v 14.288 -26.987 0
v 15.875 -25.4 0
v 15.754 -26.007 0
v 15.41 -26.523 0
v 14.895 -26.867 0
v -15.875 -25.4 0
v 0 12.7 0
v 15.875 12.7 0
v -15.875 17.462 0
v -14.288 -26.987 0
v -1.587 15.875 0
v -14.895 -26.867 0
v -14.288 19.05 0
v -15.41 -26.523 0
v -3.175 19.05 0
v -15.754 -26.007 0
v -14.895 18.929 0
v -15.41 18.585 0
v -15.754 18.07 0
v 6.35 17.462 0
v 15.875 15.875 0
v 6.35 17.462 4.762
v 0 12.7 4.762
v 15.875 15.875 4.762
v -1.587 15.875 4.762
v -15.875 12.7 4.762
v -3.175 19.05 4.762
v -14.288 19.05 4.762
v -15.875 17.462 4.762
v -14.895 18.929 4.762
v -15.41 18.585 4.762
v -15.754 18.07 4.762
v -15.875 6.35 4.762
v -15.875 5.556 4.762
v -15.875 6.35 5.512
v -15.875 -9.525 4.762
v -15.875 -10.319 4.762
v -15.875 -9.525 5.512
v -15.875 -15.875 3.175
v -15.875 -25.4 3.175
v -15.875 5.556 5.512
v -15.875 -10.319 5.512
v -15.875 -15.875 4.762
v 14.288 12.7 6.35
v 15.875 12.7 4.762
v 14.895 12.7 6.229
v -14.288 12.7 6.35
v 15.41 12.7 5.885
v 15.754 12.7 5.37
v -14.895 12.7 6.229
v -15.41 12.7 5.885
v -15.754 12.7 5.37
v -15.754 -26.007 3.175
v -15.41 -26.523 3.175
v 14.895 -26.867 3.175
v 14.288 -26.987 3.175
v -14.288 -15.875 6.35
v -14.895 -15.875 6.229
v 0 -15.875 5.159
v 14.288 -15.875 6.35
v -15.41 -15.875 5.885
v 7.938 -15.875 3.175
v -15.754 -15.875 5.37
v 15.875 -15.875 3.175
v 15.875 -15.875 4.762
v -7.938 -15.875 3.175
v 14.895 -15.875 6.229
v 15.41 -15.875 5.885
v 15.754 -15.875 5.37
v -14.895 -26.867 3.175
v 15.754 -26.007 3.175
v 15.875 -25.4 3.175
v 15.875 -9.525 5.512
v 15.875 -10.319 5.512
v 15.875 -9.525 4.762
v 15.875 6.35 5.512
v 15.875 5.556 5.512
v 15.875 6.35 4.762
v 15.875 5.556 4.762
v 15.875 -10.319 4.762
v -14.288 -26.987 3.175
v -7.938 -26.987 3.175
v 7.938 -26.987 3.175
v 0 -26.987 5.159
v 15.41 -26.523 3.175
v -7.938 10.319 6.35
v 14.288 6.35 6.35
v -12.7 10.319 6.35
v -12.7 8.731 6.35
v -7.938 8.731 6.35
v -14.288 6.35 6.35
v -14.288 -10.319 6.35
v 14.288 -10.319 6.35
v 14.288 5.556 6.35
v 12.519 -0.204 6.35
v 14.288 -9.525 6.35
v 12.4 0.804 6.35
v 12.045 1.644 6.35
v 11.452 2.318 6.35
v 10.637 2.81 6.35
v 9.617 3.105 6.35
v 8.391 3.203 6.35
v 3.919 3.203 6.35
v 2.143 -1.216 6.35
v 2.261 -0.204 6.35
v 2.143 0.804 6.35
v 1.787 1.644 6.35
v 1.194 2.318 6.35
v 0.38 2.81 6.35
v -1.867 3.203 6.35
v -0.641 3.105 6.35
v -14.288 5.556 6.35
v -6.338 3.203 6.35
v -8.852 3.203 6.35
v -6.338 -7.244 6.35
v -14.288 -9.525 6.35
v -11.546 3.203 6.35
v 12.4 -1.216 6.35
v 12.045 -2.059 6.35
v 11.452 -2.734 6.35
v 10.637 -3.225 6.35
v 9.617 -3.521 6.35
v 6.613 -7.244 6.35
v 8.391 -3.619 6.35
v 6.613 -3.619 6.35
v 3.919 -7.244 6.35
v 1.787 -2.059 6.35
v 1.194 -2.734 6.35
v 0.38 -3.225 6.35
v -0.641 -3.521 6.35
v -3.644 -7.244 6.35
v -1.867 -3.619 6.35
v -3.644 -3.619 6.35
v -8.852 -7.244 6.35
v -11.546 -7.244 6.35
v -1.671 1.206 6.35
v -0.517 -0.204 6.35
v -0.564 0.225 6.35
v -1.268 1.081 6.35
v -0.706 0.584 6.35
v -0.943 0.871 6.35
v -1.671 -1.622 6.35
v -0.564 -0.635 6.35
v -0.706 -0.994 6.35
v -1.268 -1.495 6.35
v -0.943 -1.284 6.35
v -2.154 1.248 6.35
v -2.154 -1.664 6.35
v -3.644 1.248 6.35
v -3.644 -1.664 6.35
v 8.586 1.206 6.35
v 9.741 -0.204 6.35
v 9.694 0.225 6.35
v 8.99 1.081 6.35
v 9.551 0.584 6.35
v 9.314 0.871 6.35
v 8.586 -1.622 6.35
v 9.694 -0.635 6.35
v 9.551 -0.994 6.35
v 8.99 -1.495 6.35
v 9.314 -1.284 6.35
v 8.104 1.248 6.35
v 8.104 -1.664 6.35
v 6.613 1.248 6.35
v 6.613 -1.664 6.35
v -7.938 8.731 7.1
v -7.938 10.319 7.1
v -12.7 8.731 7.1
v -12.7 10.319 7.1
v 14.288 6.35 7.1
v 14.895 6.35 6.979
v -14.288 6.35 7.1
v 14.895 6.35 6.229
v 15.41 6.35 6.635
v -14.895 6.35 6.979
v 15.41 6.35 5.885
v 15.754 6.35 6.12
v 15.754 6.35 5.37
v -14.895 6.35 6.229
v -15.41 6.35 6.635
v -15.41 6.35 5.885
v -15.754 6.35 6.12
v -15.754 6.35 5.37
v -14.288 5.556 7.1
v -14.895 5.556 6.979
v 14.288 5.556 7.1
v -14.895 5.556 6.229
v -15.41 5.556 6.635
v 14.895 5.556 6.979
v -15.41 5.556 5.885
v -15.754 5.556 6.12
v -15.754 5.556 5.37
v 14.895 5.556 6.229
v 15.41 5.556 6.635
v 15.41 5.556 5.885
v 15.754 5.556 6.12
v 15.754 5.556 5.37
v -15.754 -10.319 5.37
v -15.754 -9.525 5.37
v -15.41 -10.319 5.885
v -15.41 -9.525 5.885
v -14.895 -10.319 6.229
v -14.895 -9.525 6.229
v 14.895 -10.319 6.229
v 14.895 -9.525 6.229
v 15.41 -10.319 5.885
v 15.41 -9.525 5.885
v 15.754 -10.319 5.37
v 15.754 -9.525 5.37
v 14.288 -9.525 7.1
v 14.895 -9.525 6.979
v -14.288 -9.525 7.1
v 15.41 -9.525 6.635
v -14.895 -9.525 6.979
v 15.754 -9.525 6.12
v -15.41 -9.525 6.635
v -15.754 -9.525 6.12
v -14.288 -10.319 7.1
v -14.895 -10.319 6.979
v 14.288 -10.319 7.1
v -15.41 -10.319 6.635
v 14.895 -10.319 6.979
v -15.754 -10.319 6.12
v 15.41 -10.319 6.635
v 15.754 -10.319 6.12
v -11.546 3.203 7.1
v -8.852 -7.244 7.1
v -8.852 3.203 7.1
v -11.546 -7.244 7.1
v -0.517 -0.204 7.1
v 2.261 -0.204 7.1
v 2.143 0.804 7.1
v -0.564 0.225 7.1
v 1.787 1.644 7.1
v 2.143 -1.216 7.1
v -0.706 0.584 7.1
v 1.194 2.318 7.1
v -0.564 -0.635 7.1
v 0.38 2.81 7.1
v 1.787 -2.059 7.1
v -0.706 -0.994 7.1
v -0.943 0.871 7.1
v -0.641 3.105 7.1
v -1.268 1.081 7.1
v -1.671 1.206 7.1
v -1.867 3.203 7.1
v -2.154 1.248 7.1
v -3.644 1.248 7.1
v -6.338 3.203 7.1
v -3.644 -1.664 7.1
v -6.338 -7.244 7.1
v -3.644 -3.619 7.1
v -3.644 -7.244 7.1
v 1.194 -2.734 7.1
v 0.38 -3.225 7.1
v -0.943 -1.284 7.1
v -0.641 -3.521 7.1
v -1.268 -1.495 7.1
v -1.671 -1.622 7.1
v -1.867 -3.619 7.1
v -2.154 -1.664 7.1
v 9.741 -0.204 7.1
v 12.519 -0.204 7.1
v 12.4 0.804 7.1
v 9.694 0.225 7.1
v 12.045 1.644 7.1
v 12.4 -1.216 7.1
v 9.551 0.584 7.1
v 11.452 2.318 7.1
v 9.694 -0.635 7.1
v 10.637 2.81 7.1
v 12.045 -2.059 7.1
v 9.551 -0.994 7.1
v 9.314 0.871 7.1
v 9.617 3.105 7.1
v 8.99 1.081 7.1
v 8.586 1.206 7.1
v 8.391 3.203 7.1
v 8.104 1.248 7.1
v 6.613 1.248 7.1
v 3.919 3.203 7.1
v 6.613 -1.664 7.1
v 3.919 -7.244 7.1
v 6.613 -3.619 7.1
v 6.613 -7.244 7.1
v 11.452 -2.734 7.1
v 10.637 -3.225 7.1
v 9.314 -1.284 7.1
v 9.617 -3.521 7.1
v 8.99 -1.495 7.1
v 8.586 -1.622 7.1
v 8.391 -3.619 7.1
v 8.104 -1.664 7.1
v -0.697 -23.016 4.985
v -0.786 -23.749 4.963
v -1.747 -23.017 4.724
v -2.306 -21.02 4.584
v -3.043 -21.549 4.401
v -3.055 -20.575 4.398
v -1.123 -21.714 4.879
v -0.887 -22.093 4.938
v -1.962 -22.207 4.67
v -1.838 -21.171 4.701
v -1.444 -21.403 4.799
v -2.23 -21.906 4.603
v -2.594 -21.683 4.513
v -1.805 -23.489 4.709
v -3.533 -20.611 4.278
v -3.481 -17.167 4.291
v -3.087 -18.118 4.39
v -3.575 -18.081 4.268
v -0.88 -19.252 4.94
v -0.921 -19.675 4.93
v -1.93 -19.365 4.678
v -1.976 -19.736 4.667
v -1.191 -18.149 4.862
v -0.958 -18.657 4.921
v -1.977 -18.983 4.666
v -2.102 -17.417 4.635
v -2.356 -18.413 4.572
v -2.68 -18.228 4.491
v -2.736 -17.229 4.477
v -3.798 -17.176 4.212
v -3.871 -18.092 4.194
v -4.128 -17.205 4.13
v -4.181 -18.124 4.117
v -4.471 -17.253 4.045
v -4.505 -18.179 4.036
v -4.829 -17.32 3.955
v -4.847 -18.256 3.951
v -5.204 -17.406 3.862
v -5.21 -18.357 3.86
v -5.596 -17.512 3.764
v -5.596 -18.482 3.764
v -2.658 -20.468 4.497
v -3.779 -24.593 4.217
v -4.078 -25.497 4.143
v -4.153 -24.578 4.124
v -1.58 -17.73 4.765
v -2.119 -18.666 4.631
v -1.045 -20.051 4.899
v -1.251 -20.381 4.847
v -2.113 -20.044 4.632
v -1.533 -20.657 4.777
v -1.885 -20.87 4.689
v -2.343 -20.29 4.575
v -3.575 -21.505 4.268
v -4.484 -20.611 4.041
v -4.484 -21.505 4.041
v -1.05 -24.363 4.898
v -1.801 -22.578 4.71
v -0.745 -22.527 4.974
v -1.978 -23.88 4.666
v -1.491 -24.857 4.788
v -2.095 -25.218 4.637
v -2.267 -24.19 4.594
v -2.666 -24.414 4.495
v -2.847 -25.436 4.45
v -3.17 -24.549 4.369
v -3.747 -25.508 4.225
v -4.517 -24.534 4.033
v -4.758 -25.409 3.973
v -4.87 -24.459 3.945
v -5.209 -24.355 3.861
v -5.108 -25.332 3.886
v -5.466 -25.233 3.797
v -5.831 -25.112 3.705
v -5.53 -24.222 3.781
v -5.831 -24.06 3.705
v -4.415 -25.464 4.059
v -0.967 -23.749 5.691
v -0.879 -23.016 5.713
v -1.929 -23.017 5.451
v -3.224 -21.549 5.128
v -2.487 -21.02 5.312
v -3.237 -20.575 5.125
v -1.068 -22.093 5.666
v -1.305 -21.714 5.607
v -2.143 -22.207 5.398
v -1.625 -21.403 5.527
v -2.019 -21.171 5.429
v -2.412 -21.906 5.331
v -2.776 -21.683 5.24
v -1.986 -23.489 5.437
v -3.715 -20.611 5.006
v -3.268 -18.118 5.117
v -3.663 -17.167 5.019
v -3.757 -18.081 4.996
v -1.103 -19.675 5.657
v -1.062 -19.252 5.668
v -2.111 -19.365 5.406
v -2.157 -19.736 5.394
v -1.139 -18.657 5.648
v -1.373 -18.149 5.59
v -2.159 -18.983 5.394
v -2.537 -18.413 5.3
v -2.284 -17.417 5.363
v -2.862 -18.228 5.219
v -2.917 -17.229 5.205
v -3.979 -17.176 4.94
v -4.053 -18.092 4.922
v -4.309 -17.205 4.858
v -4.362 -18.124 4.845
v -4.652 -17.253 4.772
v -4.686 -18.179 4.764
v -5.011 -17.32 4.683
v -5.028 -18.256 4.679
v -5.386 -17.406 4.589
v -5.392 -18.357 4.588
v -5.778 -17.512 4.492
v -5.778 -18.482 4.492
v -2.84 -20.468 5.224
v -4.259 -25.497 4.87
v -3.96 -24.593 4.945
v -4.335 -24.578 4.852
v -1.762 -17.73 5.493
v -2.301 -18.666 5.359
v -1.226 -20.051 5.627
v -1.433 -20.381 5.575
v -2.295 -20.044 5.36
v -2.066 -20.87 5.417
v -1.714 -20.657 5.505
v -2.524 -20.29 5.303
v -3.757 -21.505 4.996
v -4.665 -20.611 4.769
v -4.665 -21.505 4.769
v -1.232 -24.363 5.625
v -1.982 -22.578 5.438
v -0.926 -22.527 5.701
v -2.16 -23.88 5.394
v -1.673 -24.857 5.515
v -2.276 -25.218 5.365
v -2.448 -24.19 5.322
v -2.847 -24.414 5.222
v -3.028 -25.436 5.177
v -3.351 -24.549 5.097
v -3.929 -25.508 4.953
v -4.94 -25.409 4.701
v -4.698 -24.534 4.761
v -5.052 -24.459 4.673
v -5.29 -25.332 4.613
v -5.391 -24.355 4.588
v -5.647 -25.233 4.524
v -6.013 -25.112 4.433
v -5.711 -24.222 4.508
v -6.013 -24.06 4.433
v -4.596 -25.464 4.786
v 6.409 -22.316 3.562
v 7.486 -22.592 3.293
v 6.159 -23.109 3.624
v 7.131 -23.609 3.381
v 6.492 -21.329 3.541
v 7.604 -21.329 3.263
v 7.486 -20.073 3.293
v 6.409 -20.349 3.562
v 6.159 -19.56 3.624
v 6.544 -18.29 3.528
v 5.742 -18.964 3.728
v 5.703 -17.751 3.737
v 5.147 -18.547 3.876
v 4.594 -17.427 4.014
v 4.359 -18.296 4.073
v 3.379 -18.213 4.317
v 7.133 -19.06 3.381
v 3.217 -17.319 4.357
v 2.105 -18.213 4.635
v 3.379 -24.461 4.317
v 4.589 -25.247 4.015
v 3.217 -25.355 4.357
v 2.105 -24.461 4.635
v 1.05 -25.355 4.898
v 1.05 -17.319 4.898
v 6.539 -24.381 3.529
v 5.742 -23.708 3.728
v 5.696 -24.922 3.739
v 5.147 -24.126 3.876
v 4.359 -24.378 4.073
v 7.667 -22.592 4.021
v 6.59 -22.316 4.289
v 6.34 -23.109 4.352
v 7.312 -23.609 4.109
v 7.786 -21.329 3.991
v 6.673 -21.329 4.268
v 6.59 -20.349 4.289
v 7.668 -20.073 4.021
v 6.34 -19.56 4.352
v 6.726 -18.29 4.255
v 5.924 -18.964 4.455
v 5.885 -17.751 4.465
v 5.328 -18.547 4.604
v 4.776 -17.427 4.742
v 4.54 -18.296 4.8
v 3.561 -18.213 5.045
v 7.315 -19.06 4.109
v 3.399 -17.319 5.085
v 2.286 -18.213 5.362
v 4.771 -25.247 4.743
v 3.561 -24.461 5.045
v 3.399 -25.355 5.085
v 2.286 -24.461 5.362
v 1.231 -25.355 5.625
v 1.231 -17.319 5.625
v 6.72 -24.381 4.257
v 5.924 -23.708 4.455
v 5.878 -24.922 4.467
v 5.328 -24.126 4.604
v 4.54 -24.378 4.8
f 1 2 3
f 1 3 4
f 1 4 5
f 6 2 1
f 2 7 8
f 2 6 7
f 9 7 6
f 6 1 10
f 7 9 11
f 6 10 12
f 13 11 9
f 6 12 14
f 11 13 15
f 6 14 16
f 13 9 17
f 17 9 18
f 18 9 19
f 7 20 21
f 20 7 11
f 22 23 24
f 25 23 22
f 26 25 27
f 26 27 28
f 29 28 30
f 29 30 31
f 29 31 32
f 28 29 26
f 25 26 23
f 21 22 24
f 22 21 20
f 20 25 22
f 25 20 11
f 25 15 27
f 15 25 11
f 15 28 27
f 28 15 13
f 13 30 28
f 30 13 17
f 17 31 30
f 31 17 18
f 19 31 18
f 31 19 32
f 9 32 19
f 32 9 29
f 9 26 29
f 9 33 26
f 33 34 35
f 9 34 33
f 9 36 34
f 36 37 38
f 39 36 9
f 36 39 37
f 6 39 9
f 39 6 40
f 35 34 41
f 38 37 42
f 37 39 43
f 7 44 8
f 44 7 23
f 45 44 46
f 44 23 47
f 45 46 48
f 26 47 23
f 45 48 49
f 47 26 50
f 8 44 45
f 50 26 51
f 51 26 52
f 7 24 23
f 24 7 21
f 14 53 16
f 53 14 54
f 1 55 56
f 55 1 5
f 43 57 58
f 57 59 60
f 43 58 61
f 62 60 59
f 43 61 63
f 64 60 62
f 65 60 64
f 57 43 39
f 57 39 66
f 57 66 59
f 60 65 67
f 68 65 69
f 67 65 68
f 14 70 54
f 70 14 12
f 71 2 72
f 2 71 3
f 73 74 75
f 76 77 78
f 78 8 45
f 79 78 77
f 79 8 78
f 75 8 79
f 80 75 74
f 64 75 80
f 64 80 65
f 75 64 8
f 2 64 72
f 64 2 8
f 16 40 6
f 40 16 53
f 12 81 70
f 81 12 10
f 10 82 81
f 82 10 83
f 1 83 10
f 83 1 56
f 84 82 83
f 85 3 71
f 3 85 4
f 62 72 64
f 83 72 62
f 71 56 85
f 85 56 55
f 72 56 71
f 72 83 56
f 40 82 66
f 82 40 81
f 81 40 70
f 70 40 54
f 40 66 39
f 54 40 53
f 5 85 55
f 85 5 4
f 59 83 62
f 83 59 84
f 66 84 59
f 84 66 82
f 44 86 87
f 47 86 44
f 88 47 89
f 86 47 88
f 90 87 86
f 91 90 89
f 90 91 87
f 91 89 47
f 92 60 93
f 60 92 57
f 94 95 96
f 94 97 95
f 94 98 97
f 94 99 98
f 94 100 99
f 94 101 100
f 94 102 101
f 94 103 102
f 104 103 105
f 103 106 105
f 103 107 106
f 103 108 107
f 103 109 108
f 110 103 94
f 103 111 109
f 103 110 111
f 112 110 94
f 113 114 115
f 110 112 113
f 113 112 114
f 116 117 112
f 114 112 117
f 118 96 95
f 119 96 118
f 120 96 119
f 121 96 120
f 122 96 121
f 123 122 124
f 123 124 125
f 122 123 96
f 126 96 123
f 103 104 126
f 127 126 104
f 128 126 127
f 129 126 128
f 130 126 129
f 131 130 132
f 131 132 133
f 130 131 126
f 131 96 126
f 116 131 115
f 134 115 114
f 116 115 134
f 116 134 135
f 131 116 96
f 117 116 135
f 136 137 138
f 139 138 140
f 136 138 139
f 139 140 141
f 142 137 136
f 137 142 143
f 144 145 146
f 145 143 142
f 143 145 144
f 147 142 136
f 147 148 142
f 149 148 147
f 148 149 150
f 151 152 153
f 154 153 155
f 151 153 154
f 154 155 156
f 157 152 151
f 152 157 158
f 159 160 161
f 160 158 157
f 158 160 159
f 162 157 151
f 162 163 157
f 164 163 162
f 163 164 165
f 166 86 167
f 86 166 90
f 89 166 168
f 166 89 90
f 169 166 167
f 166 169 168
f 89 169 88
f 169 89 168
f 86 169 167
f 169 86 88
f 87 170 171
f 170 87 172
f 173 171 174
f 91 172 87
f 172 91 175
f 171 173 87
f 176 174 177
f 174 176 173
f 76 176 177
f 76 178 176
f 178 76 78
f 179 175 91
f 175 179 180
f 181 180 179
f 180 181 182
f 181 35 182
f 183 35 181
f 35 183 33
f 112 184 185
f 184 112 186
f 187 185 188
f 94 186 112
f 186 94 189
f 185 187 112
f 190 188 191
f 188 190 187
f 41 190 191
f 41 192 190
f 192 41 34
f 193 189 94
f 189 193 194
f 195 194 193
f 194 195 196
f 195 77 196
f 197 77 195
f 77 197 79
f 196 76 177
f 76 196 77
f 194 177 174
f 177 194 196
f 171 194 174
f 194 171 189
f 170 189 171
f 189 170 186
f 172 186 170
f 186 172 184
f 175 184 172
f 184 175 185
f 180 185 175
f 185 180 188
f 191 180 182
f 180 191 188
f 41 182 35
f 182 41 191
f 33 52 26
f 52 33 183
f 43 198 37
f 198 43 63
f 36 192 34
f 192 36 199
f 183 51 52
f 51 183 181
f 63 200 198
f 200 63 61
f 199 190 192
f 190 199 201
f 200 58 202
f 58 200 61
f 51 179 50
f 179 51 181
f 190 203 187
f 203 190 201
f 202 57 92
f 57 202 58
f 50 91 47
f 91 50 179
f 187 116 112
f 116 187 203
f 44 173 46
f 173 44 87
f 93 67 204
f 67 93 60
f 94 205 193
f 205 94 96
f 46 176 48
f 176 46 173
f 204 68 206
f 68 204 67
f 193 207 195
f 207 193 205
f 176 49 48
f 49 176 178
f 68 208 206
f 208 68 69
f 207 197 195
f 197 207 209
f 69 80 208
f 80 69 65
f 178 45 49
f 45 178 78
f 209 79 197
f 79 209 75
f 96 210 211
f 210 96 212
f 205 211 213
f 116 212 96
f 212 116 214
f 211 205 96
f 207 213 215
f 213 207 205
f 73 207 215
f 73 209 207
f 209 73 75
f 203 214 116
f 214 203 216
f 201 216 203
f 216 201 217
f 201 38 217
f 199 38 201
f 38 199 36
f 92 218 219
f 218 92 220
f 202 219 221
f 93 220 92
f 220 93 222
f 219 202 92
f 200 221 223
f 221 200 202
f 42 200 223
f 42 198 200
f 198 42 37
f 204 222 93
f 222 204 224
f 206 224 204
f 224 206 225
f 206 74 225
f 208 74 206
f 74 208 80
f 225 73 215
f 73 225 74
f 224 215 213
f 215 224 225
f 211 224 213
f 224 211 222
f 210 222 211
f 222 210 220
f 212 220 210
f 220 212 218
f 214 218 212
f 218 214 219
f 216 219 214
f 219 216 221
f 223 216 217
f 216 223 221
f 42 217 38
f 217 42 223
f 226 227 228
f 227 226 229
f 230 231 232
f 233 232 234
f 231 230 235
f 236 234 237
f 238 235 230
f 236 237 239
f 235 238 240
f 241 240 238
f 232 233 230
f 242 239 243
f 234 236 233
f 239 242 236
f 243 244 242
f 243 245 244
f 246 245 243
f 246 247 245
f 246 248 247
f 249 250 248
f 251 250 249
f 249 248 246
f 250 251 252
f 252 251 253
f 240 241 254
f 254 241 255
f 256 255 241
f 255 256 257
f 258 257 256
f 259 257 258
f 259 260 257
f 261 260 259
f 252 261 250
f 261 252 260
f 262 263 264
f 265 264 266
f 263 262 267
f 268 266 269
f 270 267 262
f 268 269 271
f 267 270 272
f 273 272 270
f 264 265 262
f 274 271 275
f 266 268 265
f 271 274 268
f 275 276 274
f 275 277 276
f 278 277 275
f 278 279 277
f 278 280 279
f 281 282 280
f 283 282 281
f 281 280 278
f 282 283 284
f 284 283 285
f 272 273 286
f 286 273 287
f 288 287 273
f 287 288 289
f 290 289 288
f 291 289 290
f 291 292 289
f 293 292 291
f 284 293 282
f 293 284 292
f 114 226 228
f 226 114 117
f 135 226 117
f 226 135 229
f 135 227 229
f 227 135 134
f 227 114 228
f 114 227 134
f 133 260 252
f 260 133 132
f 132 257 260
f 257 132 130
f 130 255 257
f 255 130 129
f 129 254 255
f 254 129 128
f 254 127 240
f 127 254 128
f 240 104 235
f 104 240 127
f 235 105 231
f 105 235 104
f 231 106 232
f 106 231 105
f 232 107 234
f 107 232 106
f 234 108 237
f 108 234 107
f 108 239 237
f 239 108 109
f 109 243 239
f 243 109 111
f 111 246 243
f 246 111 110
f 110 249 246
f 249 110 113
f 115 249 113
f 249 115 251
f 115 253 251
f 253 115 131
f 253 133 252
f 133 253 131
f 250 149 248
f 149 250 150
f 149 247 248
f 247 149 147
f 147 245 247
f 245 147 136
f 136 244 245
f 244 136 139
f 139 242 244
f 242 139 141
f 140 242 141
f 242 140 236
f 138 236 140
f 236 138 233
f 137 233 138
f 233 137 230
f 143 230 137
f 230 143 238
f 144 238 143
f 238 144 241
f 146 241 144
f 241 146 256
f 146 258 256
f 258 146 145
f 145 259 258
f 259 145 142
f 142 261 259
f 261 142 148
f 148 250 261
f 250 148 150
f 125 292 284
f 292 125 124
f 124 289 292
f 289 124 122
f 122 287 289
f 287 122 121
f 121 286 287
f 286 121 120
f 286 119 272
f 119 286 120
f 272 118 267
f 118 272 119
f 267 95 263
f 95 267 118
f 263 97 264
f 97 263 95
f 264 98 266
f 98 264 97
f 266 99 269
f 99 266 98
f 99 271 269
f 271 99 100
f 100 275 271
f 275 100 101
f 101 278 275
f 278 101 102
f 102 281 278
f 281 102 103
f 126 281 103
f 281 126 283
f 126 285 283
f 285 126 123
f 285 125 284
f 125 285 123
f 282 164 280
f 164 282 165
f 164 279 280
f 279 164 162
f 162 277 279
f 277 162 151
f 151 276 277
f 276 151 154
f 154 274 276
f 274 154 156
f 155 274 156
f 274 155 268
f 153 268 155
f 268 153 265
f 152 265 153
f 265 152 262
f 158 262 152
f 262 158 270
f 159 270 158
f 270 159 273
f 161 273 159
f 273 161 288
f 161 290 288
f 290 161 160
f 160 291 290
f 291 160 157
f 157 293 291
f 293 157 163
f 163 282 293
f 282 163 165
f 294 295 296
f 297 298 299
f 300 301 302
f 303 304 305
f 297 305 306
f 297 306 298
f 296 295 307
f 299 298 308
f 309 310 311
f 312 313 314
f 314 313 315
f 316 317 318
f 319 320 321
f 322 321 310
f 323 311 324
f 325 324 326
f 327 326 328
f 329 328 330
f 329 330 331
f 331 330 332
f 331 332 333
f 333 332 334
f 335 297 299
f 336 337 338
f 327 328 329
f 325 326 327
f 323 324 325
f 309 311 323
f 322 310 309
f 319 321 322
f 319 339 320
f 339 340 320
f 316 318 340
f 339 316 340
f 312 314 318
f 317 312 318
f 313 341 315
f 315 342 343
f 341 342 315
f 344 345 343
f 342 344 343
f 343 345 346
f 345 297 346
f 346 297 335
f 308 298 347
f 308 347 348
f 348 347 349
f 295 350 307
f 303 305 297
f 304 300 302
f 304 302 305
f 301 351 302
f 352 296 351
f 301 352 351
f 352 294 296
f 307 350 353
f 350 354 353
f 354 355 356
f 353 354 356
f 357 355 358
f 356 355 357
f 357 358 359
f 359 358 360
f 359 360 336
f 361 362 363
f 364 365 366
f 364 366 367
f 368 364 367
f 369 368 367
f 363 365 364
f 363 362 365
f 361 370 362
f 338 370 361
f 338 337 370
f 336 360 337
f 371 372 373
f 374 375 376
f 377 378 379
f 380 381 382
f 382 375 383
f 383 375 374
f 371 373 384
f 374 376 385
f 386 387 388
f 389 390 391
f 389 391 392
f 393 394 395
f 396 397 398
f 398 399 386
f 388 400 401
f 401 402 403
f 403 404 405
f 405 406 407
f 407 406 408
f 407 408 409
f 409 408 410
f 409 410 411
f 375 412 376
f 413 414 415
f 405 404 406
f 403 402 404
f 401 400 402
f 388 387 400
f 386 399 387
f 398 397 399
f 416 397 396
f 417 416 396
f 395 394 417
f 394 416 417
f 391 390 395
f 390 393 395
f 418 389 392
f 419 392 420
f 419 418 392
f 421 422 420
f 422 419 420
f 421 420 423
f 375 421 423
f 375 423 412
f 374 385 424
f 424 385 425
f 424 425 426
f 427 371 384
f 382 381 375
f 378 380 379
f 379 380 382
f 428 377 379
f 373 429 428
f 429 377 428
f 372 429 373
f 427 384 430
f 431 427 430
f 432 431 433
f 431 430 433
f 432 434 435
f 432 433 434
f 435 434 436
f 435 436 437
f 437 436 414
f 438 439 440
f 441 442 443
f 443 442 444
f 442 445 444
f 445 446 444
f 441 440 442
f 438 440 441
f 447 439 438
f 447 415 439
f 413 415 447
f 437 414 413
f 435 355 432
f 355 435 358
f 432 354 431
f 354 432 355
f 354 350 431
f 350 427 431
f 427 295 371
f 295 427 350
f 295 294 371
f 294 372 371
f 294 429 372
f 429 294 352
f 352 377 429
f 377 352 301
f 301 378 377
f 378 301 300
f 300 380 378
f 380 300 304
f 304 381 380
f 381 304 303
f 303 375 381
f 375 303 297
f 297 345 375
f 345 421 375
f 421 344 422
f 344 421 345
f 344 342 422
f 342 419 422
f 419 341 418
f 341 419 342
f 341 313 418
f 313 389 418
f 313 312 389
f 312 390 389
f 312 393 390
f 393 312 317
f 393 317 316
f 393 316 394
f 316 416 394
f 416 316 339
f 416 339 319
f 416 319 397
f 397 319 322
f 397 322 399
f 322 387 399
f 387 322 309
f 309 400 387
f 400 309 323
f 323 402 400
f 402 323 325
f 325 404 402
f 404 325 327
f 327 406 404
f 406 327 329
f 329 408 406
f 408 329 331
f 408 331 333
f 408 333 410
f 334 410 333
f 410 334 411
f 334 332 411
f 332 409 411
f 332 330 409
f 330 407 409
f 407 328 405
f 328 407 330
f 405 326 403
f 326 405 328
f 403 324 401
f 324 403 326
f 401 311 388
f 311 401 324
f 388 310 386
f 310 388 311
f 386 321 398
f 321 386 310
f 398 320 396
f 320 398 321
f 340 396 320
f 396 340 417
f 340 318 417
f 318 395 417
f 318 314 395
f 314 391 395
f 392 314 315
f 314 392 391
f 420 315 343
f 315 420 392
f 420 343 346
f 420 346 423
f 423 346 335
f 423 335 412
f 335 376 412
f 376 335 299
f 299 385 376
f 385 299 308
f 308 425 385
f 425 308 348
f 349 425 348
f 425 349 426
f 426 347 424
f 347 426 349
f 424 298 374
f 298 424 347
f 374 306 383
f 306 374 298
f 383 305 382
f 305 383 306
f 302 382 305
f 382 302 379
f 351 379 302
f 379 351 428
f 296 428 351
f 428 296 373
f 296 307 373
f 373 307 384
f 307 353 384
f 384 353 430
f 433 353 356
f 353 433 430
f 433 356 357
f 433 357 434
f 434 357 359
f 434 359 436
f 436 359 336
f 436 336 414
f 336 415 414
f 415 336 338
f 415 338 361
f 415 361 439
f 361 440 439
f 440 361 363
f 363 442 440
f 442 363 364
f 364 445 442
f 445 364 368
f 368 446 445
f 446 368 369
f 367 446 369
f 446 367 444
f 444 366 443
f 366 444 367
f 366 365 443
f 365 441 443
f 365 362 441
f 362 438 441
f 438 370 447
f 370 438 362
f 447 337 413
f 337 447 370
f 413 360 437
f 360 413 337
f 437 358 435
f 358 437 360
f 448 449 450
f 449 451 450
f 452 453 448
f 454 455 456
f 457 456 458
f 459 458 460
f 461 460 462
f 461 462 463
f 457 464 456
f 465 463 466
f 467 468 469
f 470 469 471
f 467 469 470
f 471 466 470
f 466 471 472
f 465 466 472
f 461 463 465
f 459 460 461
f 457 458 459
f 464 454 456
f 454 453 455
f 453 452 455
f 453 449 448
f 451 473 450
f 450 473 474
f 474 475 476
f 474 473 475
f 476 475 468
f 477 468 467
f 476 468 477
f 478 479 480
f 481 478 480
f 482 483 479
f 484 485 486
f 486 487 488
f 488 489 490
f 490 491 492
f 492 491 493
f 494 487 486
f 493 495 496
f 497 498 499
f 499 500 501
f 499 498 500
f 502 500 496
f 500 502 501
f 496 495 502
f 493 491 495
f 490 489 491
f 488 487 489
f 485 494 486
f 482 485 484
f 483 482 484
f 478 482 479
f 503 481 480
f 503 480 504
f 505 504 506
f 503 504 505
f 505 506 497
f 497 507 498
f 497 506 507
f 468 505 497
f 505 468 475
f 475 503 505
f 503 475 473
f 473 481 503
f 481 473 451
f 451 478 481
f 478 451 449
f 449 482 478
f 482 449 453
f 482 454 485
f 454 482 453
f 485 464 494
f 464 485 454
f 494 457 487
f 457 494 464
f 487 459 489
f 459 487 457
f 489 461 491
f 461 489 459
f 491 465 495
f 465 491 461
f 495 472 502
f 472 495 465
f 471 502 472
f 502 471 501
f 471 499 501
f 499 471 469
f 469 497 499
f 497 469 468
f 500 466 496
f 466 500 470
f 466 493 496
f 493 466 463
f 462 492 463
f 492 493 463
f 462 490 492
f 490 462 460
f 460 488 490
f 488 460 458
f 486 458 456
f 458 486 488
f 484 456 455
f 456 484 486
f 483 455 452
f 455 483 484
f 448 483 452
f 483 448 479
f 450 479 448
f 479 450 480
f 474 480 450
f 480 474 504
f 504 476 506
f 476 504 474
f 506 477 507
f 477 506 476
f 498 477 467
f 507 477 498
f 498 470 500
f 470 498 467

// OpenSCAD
/*
 * A 3D interpretation of the PWG IPP logo.
 *
 * Copyright © 2016 by Michael R Sweet.
 */

/* Parameters */
$finalwidth = 1.25 * 25.4;
$scaling    = $finalwidth / 20.0;
$bumpout    = 0.75 / $scaling;

scale(v=[$scaling,$scaling,$scaling]) {
    /* COLOR: BLACK */
    color([0.25,0.25,0.25]) {
        /* Scanner head */
        linear_extrude(height=3) {
            polygon(points=[[-10,8],[-10,11],[-9-cos(22.5),11+sin(22.5)],[-9-cos(45),11+sin(45)],[-9-cos(67.5),11+sin(67.5)],[-9,12],[-2,12],[-1,10],[4,11],[10,10],[0,8]]);
        }
        /* Base for "3D" */
        linear_extrude(height=2) {
            polygon(points=[[-10,-16],[-10,-10],[10,-10],[10,-16],[9+cos(22.5),-16-sin(22.5)],[9+cos(45),-16-sin(45)],[9+cos(67.5),-16-sin(67.5)],[9,-17],[-9,-17],[-9-cos(67.5),-16-sin(67.5)],[-9-cos(45),-16-sin(45)],[-9-cos(22.5),-16-sin(22.5)]]);
        }
        /* Small wedge for "3D" */
        translate(v=[0,-10,2]) {
            rotate(a=[90,0,0]) {
                linear_extrude(height=7) {
                    polygon(points=[[-5,0],[0,1.25],[5,0]]);
                }
            }
        }
    }
    
    /* COLOR: PWG BLUE */
    color([75/255,90/255,168/255]) {
        /* Center body */
        translate(v=[0,8,0]) {
            rotate(a=[90,0,0]) {
                linear_extrude(height=18) {
                    polygon(points=[[-10,0],[-10,3],[-9-cos(22.5),3+sin(22.5)],[-9-cos(45),3+sin(45)],[-9-cos(67.5),3+sin(67.5)],[-9,4],[9,4],[9+cos(67.5),3+sin(67.5)],[9+cos(45),3+sin(45)],[9+cos(22.5),3+sin(22.5)],[10,3],[10,0]]);
                }
            }
        }
    }
    
    /* COLOR: WHITE */
    color([1,1,1]) {
        /* Activity light */
        translate(v=[0,0,4]) {
            linear_extrude(height=$bumpout) {
                polygon(points=[[-8,5.5],[-8,6.5],[-5,6.5],[-5,5.5]]);
            }
        }
        /* Top line */
        translate(v=[0,4,0]) {
            rotate(a=[90,0,0]) {
                linear_extrude(height=0.5) {
                    $bottom = 3;
                    $top    = $bottom + $bumpout;
                    polygon(points=[[-10,$bottom],[-10,$top],[-9-cos(22.5),$top+sin(22.5)],[-9-cos(45),$top+sin(45)],[-9-cos(67.5),$top+sin(67.5)],[-9,$top+1],[9,$top+1],[9+cos(67.5),$top+sin(67.5)],[9+cos(45),$top+sin(45)],[9+cos(22.5),$top+sin(22.5)],[10,$top],[10,$bottom],[9+cos(22.5),$bottom+sin(22.5)],[9+cos(45),$bottom+sin(45)],[9+cos(67.5),$bottom+sin(67.5)],[9,$bottom+1],[-9,$bottom+1],[-9-cos(67.5),$bottom+sin(67.5)],[-9-cos(45),$bottom+sin(45)],[-9-cos(22.5),$bottom+sin(22.5)]]);
                }
            }
        }
        /* Bottom line */
        translate(v=[0,-6,0]) {
            rotate(a=[90,0,0]) {
                linear_extrude(height=0.5) {
                    $bottom = 3;
                    $top    = $bottom + $bumpout;
                    polygon(points=[[-10,$bottom],[-10,$top],[-9-cos(22.5),$top+sin(22.5)],[-9-cos(45),$top+sin(45)],[-9-cos(67.5),$top+sin(67.5)],[-9,$top+1],[9,$top+1],[9+cos(67.5),$top+sin(67.5)],[9+cos(45),$top+sin(45)],[9+cos(22.5),$top+sin(22.5)],[10,$top],[10,$bottom],[9+cos(22.5),$bottom+sin(22.5)],[9+cos(45),$bottom+sin(45)],[9+cos(67.5),$bottom+sin(67.5)],[9,$bottom+1],[-9,$bottom+1],[-9-cos(67.5),$bottom+sin(67.5)],[-9-cos(45),$bottom+sin(45)],[-9-cos(22.5),$bottom+sin(22.5)]]);
                }
            }
        }
        /* "IPP" */
        translate(v=[0,-1.35,4]) {
            linear_extrude(height=$bumpout) {
                text("IPP", font="Helvetica Neue:style=Bold", size=6.5, halign="center", valign="center");
            }
        }
        /* "3D" */
        translate(v=[0,-13.5,3.25]) {
            rotate(a=[0,-14,0]) {
                linear_extrude(height=$bumpout) {
                    text("3", font="Helvetica Neue:style=Bold+Italic", size=5, halign="right", valign="center");
                }
            }
        }
        translate(v=[0,-13.5,3.25]) {
            rotate(a=[0,14,0]) {
                linear_extrude(height=$bumpout) {
                    text("D", font="Helvetica Neue:style=Bold+Italic", size=5, halign="left", valign="center");
                }
            }
        }
    }
}
